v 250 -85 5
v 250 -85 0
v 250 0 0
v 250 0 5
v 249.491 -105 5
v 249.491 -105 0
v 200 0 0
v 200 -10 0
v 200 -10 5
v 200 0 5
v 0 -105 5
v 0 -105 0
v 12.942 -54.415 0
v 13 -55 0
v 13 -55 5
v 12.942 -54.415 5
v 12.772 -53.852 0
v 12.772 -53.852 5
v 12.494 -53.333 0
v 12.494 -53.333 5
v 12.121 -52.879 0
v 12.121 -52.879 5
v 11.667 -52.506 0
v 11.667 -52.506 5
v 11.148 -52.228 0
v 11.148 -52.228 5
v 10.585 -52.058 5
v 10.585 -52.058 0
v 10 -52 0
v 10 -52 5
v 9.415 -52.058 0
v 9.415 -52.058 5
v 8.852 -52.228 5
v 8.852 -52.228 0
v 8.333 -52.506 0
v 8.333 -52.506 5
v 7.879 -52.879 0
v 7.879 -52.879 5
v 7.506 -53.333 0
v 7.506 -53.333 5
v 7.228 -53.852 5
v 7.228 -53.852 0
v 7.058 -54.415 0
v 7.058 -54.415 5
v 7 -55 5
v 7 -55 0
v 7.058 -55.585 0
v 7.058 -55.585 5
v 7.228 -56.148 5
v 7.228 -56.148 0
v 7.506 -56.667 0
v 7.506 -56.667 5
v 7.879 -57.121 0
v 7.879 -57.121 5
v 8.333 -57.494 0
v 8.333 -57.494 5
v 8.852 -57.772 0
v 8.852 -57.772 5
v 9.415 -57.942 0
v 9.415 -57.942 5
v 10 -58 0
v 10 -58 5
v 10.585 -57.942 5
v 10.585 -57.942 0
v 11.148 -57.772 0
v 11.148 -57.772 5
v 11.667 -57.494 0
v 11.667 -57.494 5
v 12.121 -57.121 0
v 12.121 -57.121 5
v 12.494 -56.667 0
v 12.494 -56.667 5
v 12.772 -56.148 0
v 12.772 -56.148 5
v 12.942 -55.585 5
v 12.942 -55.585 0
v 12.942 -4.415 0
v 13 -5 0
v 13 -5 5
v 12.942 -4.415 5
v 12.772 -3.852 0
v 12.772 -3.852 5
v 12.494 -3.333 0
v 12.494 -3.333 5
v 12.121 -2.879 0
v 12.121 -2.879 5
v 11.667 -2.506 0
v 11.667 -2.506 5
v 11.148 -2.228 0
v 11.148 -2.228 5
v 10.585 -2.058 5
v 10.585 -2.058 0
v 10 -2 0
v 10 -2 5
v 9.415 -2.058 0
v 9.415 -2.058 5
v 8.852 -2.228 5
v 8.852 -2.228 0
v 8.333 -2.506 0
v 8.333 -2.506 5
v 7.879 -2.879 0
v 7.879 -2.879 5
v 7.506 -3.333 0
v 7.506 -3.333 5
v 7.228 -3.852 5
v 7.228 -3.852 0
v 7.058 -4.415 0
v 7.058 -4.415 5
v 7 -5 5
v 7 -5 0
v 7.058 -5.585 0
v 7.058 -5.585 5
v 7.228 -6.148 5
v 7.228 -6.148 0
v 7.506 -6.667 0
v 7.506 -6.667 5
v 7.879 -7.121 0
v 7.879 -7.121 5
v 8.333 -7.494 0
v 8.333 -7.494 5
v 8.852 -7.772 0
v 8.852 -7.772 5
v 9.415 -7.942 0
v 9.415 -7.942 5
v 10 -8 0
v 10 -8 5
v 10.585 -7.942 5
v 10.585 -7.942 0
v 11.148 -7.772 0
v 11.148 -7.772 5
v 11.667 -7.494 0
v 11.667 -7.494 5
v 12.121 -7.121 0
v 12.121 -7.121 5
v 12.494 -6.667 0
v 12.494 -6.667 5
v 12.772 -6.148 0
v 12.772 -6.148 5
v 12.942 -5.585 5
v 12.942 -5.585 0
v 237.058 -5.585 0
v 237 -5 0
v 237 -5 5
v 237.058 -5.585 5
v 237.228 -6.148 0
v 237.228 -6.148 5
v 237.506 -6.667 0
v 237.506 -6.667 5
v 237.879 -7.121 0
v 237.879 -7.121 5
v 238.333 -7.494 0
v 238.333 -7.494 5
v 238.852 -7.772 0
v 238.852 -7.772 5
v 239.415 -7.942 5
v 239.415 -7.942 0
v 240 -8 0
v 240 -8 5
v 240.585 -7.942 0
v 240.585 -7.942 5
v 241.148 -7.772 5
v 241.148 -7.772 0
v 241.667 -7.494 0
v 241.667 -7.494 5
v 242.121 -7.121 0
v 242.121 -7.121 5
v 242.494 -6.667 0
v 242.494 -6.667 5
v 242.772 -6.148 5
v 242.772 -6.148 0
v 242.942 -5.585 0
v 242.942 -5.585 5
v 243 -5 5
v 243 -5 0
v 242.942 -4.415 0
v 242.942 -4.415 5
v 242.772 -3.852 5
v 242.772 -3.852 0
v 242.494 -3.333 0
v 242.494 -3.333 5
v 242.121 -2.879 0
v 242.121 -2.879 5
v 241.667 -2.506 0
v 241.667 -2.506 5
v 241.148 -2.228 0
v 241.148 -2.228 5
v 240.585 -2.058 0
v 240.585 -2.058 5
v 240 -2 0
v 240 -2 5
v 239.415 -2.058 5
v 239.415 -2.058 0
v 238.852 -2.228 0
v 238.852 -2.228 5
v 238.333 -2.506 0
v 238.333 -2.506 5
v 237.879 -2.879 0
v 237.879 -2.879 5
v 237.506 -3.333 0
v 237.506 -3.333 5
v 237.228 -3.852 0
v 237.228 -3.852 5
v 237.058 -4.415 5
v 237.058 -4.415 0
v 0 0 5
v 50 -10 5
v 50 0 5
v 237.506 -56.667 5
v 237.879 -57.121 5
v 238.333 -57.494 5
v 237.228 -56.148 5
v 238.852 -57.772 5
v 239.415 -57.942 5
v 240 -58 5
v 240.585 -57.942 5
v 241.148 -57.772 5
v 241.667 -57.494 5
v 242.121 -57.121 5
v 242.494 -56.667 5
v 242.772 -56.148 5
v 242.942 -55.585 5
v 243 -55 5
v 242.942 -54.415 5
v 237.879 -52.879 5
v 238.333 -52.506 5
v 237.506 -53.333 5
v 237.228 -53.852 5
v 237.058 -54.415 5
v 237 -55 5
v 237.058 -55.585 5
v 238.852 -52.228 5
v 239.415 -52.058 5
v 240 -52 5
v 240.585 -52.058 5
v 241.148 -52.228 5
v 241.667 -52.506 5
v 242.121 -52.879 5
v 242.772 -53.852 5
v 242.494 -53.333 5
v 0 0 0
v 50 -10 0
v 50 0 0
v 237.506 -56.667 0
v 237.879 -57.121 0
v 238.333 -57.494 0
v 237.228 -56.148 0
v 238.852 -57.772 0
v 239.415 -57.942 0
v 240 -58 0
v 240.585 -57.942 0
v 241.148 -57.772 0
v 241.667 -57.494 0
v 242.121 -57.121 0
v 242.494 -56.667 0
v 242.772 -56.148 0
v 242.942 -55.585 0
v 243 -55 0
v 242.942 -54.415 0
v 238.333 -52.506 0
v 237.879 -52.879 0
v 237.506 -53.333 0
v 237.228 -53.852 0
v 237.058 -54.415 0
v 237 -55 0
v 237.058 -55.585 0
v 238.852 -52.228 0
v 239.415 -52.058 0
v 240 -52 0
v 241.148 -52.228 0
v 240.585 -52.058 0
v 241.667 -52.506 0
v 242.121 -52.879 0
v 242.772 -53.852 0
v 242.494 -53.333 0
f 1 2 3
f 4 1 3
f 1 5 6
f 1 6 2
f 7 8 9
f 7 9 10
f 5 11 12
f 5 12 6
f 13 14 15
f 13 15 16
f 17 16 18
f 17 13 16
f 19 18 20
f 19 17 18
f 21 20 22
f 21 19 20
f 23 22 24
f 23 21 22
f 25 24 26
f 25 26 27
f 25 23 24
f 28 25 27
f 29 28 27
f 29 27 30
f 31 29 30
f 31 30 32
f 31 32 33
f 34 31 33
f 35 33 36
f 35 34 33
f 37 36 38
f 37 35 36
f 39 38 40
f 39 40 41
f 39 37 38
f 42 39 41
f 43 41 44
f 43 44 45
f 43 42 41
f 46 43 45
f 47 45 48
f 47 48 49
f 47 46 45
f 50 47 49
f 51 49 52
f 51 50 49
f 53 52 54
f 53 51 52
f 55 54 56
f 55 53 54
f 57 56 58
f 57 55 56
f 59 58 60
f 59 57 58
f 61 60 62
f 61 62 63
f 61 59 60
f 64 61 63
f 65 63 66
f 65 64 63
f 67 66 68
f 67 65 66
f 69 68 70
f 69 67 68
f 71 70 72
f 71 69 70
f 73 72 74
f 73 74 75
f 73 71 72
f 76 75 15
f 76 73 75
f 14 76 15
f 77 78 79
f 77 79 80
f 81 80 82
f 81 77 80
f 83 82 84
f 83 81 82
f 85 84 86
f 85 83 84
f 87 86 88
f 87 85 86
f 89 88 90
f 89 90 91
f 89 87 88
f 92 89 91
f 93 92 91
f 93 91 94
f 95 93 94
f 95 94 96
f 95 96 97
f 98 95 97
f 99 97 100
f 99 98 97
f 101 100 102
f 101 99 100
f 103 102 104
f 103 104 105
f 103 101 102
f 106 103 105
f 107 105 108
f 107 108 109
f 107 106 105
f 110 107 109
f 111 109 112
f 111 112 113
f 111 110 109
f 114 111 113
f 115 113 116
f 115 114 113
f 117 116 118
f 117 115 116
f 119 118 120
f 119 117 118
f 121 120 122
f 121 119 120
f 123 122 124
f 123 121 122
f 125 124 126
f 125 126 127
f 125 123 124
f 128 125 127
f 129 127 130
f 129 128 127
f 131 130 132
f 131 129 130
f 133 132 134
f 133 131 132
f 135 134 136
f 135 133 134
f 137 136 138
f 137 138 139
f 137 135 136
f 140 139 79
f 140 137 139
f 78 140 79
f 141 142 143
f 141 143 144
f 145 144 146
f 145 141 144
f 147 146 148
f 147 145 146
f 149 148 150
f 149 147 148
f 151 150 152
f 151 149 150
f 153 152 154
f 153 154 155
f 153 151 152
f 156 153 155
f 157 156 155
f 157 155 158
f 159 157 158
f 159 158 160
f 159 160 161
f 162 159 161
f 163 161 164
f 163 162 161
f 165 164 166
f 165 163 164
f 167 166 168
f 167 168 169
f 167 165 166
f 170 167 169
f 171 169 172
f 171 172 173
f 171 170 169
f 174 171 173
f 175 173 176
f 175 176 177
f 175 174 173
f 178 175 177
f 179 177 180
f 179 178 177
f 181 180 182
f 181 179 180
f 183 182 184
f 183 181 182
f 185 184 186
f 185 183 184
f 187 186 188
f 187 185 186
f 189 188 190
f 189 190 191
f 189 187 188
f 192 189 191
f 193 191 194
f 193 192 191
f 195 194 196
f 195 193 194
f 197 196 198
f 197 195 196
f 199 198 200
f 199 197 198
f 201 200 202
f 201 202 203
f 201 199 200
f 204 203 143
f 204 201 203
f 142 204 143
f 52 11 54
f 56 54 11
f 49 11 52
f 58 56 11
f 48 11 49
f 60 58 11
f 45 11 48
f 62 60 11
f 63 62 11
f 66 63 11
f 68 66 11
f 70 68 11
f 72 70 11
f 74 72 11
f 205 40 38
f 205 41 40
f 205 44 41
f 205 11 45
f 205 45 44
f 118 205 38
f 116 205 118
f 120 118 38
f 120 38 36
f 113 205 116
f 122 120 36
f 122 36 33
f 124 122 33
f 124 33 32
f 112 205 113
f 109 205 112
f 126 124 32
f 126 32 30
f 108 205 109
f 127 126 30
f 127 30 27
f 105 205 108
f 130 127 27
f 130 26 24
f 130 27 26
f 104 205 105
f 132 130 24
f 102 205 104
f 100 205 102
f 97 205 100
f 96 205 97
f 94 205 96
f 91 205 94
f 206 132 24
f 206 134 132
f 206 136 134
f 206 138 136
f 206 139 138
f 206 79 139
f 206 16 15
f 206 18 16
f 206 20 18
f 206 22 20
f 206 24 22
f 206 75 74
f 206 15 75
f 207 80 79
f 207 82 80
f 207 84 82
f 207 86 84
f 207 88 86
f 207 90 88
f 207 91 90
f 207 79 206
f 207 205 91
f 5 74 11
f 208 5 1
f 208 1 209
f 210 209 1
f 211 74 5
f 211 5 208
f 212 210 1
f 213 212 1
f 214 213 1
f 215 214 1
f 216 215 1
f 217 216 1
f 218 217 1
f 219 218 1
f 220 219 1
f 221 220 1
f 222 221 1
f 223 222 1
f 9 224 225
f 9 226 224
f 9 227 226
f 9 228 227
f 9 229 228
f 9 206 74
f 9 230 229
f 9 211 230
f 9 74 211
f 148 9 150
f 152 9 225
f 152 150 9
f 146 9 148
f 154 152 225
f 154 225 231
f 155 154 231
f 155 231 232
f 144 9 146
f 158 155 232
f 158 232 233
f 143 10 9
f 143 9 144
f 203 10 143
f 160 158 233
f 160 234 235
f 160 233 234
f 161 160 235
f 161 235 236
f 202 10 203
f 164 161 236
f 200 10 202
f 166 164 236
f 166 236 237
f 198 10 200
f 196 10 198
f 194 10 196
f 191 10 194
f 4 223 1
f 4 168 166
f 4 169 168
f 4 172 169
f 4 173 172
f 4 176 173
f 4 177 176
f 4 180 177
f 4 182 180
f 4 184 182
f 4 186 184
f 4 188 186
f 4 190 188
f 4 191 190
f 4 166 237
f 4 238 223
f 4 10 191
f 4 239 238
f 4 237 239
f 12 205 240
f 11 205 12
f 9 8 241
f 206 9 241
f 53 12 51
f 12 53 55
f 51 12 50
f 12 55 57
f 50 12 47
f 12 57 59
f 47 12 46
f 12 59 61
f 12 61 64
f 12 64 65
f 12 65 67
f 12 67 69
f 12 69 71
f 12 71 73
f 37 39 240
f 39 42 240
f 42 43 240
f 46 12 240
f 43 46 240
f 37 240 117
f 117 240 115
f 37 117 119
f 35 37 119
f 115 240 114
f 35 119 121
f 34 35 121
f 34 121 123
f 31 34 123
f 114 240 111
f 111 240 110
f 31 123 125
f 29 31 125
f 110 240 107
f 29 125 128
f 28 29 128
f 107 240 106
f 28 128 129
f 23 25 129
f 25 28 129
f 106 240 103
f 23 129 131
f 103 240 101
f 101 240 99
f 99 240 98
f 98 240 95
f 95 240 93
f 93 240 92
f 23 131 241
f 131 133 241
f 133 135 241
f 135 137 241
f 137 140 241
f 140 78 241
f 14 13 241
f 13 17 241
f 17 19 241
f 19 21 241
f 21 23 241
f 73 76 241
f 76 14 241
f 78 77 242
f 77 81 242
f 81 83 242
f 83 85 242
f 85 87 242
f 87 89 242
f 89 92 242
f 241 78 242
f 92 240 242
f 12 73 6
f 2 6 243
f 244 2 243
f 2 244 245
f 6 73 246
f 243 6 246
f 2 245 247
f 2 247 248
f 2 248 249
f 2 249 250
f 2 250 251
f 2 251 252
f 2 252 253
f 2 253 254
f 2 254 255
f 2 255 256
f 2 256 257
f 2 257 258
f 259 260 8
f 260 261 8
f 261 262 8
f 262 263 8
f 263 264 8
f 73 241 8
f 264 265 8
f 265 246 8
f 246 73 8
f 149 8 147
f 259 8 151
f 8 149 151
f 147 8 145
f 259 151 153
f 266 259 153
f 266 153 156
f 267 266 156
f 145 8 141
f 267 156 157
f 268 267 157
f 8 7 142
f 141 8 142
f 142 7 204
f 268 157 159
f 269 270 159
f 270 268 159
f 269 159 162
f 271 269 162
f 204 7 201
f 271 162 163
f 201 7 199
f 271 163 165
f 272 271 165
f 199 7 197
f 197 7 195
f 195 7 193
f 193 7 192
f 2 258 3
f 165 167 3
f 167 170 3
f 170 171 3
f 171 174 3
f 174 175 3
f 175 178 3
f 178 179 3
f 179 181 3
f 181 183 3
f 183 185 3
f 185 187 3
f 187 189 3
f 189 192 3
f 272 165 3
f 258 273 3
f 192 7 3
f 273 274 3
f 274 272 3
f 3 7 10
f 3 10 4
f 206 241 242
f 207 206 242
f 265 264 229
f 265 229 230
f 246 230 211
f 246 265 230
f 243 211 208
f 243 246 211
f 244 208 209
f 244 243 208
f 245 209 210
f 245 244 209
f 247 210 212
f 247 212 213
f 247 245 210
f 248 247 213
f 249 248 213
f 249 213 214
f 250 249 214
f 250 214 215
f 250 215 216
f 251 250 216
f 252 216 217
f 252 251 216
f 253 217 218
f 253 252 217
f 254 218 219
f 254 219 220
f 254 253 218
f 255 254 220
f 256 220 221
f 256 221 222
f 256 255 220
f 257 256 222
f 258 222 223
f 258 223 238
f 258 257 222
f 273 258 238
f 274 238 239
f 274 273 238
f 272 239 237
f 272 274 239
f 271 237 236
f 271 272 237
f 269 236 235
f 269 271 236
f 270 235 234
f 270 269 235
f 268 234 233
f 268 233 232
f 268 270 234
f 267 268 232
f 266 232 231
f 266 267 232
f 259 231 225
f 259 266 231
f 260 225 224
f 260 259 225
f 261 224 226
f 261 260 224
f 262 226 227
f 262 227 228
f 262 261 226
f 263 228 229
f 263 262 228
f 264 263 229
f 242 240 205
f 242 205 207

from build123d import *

# Parameters (mm, degrees)
ESQUISSE1_W             = 250
ESQUISSE1_H             = 85
ESQUISSE1_R             = 3
BOSS_EXTRU_1_DEPTH      = 5
BOSS_EXTRU_2_DEPTH      = 5
ESQUISSE3_W             = 150
ESQUISSE3_H             = 10
ENL_V_MAT_EXTRU_1_DEPTH = 10


with BuildPart() as part:
    # Esquisse1 → Boss.-Extru.1 (new body)
    with BuildSketch(Plane.XY):
        with Locations((125, -42.5)):
            Rectangle(ESQUISSE1_W, ESQUISSE1_H)
        with Locations((10, -5)):
            Circle(ESQUISSE1_R, mode=Mode.SUBTRACT)
        with Locations((10, -55)):
            Circle(ESQUISSE1_R, mode=Mode.SUBTRACT)
        with Locations(Location((240, -55, 0), (0, 0, 180))):
            Circle(ESQUISSE1_R, mode=Mode.SUBTRACT)
        with Locations(Location((240, -5, 0), (0, 0, 180))):
            Circle(ESQUISSE1_R, mode=Mode.SUBTRACT)
    extrude(amount=BOSS_EXTRU_1_DEPTH)

    # Esquisse2 → Boss.-Extru.2 (add)
    with BuildSketch(Plane.XY.offset(5)):
        Polygon((0, -85), (0, -105), (249.491359447, -105), (250, -85), align=None)
    extrude(amount=-BOSS_EXTRU_2_DEPTH)

    # Esquisse3 → Enlèv. mat.-Extru.1 (cut)
    with BuildSketch(Plane(origin=(0, 0, 0), x_dir=(-1, 0, 0), z_dir=(0, 0, -1))):
        with Locations((-125, -5)):
            Rectangle(ESQUISSE3_W, ESQUISSE3_H)
    extrude(amount=-ENL_V_MAT_EXTRU_1_DEPTH, mode=Mode.SUBTRACT)


solid = part.part
